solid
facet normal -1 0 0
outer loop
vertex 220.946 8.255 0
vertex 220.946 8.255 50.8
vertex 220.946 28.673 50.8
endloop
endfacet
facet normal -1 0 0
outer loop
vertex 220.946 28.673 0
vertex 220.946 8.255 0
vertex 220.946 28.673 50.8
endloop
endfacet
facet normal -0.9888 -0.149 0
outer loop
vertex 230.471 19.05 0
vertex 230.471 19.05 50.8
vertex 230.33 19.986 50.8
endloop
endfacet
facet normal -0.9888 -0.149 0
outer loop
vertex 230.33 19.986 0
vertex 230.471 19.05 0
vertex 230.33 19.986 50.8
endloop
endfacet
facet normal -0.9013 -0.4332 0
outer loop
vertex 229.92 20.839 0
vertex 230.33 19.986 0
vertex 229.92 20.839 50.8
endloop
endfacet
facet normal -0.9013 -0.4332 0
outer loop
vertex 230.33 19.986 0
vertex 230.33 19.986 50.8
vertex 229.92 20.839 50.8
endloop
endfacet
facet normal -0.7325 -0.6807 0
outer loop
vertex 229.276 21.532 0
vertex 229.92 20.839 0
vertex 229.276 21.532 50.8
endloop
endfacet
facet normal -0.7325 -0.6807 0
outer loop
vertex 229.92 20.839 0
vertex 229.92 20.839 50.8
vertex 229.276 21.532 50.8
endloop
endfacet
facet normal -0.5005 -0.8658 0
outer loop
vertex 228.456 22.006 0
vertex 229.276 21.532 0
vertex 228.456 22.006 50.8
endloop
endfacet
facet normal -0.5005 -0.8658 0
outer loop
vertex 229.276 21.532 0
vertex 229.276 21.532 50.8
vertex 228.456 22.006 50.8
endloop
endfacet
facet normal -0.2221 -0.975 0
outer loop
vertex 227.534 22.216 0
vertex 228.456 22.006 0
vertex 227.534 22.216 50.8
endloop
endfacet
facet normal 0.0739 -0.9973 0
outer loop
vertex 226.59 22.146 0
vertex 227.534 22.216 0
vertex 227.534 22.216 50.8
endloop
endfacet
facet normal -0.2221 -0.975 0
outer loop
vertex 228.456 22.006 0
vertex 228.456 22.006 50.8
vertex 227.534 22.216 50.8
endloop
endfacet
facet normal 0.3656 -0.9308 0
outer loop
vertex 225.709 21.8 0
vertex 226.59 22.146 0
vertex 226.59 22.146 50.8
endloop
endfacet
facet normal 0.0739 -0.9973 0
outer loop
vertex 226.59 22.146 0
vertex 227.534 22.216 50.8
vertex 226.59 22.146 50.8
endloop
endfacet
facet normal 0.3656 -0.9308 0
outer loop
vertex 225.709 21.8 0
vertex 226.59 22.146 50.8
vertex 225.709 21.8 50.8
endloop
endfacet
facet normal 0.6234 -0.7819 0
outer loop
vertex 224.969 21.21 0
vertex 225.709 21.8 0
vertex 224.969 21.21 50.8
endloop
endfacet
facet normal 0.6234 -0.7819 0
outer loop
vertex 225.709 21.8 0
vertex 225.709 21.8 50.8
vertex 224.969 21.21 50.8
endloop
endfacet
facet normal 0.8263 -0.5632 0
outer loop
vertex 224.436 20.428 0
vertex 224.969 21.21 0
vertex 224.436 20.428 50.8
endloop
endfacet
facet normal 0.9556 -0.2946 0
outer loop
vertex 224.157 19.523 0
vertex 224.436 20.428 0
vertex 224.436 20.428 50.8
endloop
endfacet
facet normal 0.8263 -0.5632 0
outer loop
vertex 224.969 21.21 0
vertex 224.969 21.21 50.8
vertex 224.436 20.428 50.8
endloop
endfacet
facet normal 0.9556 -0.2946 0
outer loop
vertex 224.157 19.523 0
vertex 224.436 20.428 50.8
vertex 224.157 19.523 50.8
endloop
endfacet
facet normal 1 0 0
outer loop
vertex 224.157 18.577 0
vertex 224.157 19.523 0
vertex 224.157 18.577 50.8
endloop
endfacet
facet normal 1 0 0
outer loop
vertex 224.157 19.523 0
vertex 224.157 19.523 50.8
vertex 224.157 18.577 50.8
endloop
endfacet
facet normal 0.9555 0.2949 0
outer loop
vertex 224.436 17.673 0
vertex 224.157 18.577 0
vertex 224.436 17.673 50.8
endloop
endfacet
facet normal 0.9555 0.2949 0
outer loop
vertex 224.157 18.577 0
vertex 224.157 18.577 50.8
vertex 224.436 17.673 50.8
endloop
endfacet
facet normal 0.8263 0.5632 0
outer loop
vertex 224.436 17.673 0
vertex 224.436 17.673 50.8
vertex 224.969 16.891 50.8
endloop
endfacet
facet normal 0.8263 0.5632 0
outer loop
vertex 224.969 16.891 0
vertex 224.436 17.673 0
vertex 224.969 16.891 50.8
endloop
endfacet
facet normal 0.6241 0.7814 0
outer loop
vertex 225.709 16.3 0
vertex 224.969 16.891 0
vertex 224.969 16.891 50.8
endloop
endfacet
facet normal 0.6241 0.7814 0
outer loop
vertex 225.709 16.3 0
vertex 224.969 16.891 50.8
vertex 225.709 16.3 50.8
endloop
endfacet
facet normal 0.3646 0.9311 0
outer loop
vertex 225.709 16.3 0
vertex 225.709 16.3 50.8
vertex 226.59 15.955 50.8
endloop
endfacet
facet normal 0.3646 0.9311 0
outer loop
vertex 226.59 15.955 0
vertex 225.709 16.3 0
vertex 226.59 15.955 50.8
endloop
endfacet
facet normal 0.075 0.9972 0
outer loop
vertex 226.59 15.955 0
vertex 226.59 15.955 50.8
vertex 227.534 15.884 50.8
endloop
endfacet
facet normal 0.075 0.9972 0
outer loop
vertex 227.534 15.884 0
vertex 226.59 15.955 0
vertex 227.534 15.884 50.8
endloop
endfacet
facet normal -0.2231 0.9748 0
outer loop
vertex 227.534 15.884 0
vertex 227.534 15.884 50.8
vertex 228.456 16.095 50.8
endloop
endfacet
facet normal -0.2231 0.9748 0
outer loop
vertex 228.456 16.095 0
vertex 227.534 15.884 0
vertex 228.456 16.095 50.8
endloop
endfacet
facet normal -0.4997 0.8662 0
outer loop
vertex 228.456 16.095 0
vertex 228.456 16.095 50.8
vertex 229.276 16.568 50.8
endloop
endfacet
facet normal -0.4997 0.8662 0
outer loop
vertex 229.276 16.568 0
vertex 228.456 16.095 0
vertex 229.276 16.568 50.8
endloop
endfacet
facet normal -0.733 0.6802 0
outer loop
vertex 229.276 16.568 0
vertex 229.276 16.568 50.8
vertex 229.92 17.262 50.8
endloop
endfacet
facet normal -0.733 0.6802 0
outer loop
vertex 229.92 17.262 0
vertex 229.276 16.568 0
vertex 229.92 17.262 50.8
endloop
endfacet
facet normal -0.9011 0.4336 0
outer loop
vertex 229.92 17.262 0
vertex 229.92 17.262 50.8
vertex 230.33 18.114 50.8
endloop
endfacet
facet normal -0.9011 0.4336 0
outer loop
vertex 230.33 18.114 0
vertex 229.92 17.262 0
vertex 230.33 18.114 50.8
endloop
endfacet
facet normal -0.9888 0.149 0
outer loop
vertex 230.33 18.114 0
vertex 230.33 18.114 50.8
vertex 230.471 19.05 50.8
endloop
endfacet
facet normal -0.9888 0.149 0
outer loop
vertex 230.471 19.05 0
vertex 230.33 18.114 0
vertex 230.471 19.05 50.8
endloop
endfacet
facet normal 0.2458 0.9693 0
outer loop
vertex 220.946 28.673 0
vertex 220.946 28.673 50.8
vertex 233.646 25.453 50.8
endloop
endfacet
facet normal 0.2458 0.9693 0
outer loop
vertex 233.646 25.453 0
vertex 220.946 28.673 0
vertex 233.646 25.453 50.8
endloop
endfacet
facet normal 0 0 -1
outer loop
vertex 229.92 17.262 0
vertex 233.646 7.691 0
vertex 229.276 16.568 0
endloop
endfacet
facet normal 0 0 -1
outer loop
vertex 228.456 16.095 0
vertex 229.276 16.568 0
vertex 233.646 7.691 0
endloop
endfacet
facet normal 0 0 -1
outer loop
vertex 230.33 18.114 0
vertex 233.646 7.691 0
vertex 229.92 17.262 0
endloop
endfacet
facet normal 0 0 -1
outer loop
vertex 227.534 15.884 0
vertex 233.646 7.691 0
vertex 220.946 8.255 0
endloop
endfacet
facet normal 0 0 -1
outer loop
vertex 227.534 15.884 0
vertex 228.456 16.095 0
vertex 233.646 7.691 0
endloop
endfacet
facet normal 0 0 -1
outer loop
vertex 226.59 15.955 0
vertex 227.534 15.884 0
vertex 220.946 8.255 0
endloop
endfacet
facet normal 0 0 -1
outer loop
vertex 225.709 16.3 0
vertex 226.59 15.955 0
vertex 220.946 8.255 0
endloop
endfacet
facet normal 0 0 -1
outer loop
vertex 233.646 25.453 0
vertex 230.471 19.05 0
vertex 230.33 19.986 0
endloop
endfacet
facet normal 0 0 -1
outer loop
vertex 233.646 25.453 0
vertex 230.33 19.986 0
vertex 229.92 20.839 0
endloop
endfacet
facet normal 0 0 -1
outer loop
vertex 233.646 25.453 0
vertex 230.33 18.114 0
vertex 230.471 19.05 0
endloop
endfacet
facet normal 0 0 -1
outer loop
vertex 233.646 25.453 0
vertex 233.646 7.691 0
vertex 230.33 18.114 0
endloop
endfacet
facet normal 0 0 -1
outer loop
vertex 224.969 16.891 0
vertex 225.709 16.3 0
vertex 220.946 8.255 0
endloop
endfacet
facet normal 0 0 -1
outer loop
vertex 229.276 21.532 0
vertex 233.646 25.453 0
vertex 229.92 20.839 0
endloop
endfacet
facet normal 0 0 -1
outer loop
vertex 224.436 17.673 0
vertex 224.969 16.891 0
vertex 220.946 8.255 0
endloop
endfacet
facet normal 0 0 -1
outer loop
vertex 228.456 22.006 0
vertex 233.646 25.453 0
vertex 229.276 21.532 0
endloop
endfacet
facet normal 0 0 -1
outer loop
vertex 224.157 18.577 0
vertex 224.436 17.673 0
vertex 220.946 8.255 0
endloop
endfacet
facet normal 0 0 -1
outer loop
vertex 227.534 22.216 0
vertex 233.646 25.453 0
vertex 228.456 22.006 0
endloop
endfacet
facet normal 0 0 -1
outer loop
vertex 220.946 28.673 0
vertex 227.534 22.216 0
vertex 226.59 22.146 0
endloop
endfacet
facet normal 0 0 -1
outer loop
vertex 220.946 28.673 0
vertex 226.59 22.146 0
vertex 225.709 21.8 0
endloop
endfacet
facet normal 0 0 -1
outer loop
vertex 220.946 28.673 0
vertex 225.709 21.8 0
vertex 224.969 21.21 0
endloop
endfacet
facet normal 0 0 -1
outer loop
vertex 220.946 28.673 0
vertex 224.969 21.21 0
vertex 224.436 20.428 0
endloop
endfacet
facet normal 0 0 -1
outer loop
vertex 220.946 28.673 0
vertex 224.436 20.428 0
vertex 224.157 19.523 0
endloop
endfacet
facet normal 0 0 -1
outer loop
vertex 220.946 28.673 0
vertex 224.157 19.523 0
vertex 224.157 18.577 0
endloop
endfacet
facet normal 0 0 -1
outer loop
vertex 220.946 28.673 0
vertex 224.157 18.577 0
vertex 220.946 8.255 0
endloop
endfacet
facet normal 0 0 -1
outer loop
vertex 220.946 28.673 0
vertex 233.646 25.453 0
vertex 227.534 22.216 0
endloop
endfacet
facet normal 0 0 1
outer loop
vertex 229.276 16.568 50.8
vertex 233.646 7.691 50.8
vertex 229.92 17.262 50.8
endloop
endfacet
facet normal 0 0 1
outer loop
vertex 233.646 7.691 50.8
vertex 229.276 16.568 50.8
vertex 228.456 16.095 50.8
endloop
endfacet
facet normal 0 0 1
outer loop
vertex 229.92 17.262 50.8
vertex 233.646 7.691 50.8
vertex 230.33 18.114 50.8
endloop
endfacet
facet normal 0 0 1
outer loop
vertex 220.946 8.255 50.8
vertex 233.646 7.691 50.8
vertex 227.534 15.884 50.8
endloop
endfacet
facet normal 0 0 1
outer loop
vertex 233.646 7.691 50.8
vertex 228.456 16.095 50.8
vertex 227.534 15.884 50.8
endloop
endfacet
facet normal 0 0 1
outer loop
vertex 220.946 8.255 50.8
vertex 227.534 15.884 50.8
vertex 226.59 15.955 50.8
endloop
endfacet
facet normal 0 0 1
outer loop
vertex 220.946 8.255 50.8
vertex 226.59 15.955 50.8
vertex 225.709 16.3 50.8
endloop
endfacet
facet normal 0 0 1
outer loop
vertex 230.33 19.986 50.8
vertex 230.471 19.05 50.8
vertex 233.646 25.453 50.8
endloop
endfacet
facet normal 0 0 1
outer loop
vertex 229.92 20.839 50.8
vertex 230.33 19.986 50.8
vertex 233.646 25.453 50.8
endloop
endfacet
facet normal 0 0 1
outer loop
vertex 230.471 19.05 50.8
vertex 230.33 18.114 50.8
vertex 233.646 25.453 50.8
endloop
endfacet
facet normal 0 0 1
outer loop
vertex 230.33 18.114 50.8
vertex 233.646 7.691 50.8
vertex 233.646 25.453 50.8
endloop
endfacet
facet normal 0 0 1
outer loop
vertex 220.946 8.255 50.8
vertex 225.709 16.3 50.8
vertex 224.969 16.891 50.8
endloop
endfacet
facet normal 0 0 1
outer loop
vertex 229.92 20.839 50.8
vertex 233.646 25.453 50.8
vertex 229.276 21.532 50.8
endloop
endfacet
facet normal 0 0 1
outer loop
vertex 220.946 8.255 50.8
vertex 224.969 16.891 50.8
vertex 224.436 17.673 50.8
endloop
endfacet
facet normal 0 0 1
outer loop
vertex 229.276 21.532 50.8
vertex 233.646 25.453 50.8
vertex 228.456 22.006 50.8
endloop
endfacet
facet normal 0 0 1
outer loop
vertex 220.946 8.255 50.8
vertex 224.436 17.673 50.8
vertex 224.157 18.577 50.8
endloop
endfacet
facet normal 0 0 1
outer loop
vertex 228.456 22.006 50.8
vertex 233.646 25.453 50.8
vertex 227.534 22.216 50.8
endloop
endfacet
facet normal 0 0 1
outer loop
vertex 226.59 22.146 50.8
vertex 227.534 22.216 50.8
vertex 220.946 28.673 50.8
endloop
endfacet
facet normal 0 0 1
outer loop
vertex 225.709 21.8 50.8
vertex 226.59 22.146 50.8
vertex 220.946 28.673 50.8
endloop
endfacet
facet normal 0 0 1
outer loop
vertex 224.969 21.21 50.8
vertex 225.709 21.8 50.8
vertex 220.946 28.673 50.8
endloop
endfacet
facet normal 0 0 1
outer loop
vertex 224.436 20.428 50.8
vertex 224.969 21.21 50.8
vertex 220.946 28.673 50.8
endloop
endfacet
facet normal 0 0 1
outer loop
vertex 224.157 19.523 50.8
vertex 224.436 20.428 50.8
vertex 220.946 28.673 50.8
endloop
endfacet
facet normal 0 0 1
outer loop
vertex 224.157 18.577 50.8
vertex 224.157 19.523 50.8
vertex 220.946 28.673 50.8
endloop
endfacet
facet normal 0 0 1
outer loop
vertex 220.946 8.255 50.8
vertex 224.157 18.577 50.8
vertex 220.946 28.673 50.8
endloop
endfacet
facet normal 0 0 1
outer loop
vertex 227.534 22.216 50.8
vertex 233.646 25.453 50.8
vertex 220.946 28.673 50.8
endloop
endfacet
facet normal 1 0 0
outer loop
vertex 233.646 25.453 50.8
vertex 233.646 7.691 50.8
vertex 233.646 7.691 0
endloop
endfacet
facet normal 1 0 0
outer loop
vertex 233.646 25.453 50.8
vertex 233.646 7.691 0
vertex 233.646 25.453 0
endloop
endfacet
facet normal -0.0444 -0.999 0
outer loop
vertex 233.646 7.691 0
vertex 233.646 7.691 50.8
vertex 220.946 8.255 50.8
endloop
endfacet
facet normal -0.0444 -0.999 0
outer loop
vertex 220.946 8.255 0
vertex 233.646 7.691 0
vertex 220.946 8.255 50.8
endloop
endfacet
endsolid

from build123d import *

# Parameters (mm, degrees)
BOSS_EXTRUDE1_DEPTH = 50.8
SKETCH2_R           = 6.35
SKETCH2_R_2         = 3.175
CUT_EXTRUDE1_DEPTH  = 320.788688435
SKETCH3_W           = 116.84
SKETCH3_H           = 50.8
CUT_EXTRUDE2_DEPTH  = 320.788688435
SKETCH4_W           = 250.150530068
SKETCH4_H           = 117.489254048
CUT_EXTRUDE3_DEPTH  = 244.924275514


with BuildPart() as part:
    # Sketch1 → Boss-Extrude1 (new body)
    with BuildSketch(Plane.XY):
        with BuildLine():
            add(Edge.make_bspline(
                [(0.000560351, 0.000130087), (0.810633127, 7.359196055), (8.649092025, 17.856605174), (26.286719818, 29.975176328), (52.111128271, 42.069215275), (89.597618475, 49.290763054), (131.400792109, 47.884831915), (173.256699242, 40.041104278), (217.961060472, 29.612974894), (256.952064401, 19.528920948), (290.35983767, 8.71099439), (301.273197721, 4.382828139), (314.816918223, -0.516206742), (309.846313895, 0.000130087)],
                knots=[0, 0, 0, 0, 0.060863618, 0.113688265, 0.188608742, 0.312908923, 0.448482434, 0.557612135, 0.691544113, 0.852438279, 0.92975597, 0.976058229, 1, 1, 1, 1], degree=3))
            add(Edge.make_bspline(
                [(309.846313895, 0.000130087), (303.956832565, 1.47095521), (293.989507544, 2.093987313), (276.26402299, 4.514356704), (260.846344817, 5.427413394), (235.858814759, 7.870306192), (205.101424636, 8.838080282), (157.718638092, 9.030650149), (110.497331172, 6.181495223), (66.506197185, -0.586669107), (36.454672816, -6.098499901), (15.316603331, -6.189065841), (1.230714189, -6.924076091), (0.000560351, 0.000130087)],
                knots=[0, 0, 0, 0, 0.057787081, 0.095274891, 0.171021118, 0.205339302, 0.335319146, 0.464904334, 0.658702312, 0.785511947, 0.893517288, 0.94309214, 1, 1, 1, 1], degree=3))
        make_face()
    extrude(amount=BOSS_EXTRUDE1_DEPTH)

    # Sketch2 → Cut-Extrude1 (cut, through all)
    with BuildSketch(Plane.XY.offset(50.8)):
        with Locations((20.32, 10.16)):
            Circle(SKETCH2_R)
        with Locations((227.296313895, 19.050130087)):
            Circle(SKETCH2_R_2)
    extrude(amount=-CUT_EXTRUDE1_DEPTH, mode=Mode.SUBTRACT)

    # Sketch3 → Cut-Extrude2 (cut, through all)
    with BuildSketch(Plane.XY.offset(50.8)):
        with Locations((292.066313895, 19.050130087)):
            Rectangle(SKETCH3_W, SKETCH3_H)
    extrude(amount=-CUT_EXTRUDE2_DEPTH, mode=Mode.SUBTRACT)

    # Sketch4 → Cut-Extrude3 (cut, through all)
    with BuildSketch(Plane.XY.offset(50.8)):
        with Locations((95.871048861, 34.528076629)):
            Rectangle(SKETCH4_W, SKETCH4_H)
    extrude(amount=-CUT_EXTRUDE3_DEPTH, mode=Mode.SUBTRACT)


solid = part.part
